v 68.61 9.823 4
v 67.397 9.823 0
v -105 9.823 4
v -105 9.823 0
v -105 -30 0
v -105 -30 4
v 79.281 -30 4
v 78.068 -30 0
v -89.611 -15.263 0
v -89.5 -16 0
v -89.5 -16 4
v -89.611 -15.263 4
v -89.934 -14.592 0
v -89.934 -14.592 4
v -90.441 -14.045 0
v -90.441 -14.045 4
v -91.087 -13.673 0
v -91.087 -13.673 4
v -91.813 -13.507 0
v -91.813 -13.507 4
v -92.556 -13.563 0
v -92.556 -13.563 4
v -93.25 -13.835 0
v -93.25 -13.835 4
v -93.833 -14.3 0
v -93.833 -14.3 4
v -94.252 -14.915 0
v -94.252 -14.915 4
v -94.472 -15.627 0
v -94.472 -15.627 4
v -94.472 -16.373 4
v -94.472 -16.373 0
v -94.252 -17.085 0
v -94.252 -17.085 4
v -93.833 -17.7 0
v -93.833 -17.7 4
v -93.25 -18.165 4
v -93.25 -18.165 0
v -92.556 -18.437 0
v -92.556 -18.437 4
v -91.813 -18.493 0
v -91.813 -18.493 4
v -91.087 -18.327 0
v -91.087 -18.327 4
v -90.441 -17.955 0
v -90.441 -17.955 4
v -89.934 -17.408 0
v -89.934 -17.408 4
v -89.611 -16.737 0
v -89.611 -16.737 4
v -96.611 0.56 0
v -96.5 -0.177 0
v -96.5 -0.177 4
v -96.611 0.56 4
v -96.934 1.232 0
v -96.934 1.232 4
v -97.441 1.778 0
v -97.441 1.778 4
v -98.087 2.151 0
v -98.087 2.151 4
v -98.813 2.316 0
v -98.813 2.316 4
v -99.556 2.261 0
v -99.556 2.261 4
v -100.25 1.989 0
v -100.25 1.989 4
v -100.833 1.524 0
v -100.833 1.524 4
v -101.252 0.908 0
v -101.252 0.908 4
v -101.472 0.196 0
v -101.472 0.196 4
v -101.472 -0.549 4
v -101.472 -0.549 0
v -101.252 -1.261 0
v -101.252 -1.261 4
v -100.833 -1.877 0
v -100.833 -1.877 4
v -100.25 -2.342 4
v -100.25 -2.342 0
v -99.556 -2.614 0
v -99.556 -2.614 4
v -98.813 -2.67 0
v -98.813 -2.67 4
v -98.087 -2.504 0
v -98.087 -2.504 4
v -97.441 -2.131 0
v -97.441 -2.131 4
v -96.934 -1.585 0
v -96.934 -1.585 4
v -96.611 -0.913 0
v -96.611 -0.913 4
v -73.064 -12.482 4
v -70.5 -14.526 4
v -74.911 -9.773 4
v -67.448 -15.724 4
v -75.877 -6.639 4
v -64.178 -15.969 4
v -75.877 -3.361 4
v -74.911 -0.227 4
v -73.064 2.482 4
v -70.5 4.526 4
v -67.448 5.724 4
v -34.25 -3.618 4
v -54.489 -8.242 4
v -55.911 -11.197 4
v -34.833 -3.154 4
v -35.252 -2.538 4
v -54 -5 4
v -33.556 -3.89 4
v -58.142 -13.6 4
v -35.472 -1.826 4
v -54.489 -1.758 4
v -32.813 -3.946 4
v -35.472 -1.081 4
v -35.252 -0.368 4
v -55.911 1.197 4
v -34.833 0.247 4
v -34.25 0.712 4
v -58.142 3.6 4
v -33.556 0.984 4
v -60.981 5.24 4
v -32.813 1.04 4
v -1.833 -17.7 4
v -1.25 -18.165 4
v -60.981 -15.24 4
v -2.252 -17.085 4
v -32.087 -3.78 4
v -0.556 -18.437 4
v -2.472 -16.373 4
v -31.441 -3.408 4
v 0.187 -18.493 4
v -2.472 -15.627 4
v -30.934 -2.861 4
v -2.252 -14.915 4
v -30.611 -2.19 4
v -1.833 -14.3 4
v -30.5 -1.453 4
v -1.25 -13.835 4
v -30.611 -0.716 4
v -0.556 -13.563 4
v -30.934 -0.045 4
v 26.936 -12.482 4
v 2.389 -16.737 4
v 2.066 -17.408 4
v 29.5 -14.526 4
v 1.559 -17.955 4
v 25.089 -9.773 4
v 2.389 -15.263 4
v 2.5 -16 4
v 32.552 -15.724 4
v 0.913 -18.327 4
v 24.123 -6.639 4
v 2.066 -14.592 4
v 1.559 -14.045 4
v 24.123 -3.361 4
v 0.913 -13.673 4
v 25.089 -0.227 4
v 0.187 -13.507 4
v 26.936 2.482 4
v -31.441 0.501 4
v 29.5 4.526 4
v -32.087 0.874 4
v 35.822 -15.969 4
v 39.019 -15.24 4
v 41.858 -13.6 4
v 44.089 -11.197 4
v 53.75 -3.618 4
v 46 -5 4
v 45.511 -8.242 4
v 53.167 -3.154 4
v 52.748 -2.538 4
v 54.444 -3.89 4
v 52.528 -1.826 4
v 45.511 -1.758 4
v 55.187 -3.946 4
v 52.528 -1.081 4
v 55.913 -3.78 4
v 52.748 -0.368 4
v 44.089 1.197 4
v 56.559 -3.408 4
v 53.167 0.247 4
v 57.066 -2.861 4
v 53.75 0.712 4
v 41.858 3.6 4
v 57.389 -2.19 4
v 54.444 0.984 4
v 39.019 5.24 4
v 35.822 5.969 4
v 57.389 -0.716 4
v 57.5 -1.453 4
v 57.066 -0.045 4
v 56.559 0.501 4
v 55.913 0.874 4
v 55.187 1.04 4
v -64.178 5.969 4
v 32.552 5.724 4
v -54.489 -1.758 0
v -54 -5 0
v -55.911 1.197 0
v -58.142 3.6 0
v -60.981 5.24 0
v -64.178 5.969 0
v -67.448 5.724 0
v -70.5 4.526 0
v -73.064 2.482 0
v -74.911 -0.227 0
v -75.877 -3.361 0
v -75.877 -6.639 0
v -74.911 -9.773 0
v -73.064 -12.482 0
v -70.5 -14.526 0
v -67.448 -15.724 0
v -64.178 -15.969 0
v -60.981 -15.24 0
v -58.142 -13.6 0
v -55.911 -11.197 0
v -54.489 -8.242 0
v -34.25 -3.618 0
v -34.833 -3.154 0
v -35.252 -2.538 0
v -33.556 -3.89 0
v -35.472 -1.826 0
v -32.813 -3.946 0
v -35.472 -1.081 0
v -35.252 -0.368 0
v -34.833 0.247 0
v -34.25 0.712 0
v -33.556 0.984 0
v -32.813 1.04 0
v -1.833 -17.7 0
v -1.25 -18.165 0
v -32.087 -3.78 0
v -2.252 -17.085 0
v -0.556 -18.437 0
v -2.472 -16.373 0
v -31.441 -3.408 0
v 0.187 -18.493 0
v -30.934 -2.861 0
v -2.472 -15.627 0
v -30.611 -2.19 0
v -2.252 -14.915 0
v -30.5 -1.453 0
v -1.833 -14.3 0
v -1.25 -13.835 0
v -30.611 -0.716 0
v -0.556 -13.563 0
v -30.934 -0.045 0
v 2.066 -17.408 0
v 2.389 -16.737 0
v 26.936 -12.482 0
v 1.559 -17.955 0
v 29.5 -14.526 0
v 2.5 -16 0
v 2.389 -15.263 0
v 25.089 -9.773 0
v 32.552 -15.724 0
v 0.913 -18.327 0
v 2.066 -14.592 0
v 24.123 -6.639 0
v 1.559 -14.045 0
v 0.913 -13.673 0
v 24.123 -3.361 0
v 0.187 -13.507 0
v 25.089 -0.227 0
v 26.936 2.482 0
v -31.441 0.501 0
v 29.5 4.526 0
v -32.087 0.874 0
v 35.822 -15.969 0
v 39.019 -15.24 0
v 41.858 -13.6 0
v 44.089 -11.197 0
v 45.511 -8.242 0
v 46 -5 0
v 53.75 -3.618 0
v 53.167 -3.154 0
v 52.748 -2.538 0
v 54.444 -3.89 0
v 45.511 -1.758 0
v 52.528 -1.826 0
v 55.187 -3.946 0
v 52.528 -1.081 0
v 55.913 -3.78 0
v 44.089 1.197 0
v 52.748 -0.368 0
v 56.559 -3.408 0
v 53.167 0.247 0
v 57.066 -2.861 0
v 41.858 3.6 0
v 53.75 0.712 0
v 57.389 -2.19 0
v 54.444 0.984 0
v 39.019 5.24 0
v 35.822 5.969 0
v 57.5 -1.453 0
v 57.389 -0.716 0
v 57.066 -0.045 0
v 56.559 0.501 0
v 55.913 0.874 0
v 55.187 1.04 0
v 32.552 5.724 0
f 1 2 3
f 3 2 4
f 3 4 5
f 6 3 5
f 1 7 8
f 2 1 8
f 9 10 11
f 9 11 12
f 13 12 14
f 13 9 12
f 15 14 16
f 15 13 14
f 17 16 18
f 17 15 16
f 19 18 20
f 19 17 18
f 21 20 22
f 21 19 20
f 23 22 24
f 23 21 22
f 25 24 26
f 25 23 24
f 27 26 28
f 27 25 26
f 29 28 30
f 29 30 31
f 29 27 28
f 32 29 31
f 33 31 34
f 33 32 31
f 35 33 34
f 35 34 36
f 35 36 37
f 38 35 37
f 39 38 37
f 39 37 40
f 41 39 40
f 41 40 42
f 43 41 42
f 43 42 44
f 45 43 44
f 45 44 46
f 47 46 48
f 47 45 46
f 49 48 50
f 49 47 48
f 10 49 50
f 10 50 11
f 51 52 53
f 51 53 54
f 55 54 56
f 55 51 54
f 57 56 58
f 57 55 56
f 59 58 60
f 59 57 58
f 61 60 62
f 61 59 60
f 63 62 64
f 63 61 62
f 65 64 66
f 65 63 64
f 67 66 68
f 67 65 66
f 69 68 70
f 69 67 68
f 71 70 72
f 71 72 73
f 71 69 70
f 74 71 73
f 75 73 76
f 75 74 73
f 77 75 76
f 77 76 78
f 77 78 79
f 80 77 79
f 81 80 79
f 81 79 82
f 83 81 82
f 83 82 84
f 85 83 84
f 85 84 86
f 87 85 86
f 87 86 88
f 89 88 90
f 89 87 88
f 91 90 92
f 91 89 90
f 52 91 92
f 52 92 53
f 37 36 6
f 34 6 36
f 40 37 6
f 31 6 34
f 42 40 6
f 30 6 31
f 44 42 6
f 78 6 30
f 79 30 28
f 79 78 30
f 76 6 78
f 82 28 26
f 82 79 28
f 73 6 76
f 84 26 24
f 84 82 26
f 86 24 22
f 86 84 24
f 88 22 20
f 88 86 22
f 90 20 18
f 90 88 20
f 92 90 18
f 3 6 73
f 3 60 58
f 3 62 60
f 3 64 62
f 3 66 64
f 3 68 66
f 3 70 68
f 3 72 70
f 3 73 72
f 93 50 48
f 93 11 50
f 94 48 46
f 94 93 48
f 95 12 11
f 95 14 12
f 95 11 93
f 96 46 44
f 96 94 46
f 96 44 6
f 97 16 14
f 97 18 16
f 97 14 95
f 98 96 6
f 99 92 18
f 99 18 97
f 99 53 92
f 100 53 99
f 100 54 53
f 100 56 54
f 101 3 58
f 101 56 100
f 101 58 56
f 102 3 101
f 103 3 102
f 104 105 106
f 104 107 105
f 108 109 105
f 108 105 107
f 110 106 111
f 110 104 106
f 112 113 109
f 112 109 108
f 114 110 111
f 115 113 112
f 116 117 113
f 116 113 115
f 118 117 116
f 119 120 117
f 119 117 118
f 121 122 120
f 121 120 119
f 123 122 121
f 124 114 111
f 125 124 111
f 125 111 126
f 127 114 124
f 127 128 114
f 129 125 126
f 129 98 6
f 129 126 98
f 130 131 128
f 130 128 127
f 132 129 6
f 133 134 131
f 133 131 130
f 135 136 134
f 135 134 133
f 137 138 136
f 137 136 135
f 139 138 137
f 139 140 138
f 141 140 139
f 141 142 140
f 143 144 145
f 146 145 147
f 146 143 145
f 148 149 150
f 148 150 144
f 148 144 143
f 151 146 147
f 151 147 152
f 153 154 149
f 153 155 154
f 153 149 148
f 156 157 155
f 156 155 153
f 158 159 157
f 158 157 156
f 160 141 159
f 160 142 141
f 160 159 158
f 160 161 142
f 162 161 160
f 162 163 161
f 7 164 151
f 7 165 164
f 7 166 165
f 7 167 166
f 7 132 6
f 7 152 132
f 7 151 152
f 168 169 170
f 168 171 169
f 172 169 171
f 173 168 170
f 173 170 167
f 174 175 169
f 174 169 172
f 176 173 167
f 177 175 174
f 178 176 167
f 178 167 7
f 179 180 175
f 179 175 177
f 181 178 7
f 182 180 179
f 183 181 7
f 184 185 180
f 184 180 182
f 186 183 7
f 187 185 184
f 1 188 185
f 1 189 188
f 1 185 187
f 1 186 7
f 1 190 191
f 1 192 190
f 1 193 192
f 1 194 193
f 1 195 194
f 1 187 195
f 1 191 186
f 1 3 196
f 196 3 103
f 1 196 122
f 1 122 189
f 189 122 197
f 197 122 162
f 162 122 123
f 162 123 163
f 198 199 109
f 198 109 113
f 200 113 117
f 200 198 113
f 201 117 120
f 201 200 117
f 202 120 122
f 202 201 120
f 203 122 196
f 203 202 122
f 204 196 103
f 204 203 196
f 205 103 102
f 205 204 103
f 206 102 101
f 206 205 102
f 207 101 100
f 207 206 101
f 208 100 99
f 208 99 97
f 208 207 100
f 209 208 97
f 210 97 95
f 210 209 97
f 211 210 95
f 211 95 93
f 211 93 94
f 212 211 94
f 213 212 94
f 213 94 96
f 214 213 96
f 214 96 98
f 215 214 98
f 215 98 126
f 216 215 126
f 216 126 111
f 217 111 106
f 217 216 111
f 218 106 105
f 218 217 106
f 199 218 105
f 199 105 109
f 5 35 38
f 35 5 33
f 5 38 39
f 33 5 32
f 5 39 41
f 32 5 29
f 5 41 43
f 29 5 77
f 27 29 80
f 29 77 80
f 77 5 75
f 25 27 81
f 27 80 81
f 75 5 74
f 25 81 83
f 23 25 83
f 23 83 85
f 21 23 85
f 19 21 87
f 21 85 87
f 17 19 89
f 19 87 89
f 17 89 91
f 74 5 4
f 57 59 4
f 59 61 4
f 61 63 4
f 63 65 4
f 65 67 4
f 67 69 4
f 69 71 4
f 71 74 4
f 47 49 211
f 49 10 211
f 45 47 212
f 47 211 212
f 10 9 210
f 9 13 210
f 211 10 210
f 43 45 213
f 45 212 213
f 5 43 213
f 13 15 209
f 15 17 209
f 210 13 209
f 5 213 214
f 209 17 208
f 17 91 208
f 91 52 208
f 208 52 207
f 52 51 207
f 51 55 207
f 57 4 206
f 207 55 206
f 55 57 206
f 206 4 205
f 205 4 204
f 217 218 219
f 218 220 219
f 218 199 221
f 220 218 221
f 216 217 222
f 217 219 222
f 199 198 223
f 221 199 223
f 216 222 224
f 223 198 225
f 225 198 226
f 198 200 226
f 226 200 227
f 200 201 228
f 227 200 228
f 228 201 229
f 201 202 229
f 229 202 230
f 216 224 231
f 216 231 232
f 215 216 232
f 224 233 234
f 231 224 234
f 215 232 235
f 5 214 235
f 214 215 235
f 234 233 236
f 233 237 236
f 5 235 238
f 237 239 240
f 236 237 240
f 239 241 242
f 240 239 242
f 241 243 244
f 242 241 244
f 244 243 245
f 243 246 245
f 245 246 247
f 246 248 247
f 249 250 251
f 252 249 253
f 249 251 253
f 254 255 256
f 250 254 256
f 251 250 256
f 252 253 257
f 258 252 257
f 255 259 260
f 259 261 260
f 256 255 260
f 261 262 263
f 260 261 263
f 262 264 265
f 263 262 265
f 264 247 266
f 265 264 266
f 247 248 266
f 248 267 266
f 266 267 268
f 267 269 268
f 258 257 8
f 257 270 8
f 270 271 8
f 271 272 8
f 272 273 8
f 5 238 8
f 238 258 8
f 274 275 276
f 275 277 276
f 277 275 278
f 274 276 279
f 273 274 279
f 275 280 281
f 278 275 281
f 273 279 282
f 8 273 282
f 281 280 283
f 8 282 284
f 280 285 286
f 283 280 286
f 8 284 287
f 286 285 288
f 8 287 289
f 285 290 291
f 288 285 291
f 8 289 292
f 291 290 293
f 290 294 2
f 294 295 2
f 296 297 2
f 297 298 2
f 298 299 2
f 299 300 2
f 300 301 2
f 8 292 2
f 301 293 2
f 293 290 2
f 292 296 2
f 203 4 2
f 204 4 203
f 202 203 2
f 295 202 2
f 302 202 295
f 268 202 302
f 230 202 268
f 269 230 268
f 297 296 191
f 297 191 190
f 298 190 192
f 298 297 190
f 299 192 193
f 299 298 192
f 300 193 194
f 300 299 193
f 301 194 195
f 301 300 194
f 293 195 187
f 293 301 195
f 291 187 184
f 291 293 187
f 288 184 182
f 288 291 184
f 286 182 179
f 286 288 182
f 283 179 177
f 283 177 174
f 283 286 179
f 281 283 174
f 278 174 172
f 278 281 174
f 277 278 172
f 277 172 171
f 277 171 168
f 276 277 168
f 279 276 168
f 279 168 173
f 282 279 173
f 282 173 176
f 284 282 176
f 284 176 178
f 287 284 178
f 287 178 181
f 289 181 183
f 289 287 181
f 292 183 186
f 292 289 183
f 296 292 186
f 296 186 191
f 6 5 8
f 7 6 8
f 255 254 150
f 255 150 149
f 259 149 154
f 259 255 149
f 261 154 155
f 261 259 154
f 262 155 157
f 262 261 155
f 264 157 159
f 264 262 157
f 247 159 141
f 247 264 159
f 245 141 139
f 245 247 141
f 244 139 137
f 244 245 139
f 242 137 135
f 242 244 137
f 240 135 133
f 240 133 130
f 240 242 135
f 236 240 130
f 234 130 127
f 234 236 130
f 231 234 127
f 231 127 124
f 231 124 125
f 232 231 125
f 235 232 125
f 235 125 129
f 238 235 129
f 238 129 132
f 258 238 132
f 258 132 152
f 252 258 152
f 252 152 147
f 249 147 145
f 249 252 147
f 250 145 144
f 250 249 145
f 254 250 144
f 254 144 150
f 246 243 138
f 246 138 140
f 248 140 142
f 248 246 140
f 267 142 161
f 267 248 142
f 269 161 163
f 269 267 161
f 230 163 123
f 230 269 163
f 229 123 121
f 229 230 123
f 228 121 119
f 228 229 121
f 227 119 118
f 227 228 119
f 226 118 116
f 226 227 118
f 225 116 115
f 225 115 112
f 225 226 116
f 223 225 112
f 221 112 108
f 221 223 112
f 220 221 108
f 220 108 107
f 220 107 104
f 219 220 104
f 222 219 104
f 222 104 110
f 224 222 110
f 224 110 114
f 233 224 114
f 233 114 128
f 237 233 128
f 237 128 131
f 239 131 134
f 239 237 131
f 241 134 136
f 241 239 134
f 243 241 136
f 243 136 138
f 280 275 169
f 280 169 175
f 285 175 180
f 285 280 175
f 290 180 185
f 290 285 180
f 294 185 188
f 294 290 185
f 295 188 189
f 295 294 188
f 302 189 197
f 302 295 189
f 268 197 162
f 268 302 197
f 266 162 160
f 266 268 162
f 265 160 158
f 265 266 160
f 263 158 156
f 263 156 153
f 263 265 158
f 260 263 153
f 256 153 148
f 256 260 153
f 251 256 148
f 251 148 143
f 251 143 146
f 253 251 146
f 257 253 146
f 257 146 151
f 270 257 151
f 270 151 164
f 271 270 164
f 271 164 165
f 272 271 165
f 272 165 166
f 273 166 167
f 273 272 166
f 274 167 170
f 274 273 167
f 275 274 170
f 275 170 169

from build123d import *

# Parameters (mm, degrees)
SKETCH2_R           = 11
SKETCH2_R_2         = 2.5
BOSS_EXTRUDE1_DEPTH = 4
CHAMFER1_SIZE       = 6.82619664
CHAMFER1_SIZE_2     = 2


with BuildPart() as part:
    # Sketch2 → Boss-Extrude1 (new body)
    with BuildSketch(Plane.XY):
        Polygon((80.138070711, -30), (69.467402807, 9.823474767), (-105, 9.823474767), (-105, -30), align=None)
        with Locations((35, -5)):
            Circle(SKETCH2_R, mode=Mode.SUBTRACT)
        with Locations((-65, -5)):
            Circle(SKETCH2_R, mode=Mode.SUBTRACT)
        with Locations((-92, -16)):
            Circle(SKETCH2_R_2, mode=Mode.SUBTRACT)
        with Locations((0, -16)):
            Circle(SKETCH2_R_2, mode=Mode.SUBTRACT)
        with Locations((-99, -0.176525233)):
            Circle(SKETCH2_R_2, mode=Mode.SUBTRACT)
        with Locations((-33, -1.453163789)):
            Circle(SKETCH2_R_2, mode=Mode.SUBTRACT)
        with Locations((55, -1.453163789)):
            Circle(SKETCH2_R_2, mode=Mode.SUBTRACT)
    extrude(amount=BOSS_EXTRUDE1_DEPTH)

    # Chamfer1
    # the kernel refuses this chamfer: 6.82619664, 2 mm, written as the material it takes off along each edge
    with BuildSketch(Plane(origin=(84.724761545, -47.117763232, 0), x_dir=(0.010461335179728238, 0.0028031063131594876, 0.9999413498107049), z_dir=(-0.25881904510252185, 0.965925826289068, 0))) as chamfer1_piece_1:
        Polygon((CHAMFER1_SIZE * 0.999941349797, -CHAMFER1_SIZE * 0.0108303711267), (-CHAMFER1_SIZE_2 * 0.0108303711269, -CHAMFER1_SIZE_2 * 0.999941349811), (0, 0), align=None)
    extrude(amount=76.67151992, mode=Mode.SUBTRACT)


solid = part.part
